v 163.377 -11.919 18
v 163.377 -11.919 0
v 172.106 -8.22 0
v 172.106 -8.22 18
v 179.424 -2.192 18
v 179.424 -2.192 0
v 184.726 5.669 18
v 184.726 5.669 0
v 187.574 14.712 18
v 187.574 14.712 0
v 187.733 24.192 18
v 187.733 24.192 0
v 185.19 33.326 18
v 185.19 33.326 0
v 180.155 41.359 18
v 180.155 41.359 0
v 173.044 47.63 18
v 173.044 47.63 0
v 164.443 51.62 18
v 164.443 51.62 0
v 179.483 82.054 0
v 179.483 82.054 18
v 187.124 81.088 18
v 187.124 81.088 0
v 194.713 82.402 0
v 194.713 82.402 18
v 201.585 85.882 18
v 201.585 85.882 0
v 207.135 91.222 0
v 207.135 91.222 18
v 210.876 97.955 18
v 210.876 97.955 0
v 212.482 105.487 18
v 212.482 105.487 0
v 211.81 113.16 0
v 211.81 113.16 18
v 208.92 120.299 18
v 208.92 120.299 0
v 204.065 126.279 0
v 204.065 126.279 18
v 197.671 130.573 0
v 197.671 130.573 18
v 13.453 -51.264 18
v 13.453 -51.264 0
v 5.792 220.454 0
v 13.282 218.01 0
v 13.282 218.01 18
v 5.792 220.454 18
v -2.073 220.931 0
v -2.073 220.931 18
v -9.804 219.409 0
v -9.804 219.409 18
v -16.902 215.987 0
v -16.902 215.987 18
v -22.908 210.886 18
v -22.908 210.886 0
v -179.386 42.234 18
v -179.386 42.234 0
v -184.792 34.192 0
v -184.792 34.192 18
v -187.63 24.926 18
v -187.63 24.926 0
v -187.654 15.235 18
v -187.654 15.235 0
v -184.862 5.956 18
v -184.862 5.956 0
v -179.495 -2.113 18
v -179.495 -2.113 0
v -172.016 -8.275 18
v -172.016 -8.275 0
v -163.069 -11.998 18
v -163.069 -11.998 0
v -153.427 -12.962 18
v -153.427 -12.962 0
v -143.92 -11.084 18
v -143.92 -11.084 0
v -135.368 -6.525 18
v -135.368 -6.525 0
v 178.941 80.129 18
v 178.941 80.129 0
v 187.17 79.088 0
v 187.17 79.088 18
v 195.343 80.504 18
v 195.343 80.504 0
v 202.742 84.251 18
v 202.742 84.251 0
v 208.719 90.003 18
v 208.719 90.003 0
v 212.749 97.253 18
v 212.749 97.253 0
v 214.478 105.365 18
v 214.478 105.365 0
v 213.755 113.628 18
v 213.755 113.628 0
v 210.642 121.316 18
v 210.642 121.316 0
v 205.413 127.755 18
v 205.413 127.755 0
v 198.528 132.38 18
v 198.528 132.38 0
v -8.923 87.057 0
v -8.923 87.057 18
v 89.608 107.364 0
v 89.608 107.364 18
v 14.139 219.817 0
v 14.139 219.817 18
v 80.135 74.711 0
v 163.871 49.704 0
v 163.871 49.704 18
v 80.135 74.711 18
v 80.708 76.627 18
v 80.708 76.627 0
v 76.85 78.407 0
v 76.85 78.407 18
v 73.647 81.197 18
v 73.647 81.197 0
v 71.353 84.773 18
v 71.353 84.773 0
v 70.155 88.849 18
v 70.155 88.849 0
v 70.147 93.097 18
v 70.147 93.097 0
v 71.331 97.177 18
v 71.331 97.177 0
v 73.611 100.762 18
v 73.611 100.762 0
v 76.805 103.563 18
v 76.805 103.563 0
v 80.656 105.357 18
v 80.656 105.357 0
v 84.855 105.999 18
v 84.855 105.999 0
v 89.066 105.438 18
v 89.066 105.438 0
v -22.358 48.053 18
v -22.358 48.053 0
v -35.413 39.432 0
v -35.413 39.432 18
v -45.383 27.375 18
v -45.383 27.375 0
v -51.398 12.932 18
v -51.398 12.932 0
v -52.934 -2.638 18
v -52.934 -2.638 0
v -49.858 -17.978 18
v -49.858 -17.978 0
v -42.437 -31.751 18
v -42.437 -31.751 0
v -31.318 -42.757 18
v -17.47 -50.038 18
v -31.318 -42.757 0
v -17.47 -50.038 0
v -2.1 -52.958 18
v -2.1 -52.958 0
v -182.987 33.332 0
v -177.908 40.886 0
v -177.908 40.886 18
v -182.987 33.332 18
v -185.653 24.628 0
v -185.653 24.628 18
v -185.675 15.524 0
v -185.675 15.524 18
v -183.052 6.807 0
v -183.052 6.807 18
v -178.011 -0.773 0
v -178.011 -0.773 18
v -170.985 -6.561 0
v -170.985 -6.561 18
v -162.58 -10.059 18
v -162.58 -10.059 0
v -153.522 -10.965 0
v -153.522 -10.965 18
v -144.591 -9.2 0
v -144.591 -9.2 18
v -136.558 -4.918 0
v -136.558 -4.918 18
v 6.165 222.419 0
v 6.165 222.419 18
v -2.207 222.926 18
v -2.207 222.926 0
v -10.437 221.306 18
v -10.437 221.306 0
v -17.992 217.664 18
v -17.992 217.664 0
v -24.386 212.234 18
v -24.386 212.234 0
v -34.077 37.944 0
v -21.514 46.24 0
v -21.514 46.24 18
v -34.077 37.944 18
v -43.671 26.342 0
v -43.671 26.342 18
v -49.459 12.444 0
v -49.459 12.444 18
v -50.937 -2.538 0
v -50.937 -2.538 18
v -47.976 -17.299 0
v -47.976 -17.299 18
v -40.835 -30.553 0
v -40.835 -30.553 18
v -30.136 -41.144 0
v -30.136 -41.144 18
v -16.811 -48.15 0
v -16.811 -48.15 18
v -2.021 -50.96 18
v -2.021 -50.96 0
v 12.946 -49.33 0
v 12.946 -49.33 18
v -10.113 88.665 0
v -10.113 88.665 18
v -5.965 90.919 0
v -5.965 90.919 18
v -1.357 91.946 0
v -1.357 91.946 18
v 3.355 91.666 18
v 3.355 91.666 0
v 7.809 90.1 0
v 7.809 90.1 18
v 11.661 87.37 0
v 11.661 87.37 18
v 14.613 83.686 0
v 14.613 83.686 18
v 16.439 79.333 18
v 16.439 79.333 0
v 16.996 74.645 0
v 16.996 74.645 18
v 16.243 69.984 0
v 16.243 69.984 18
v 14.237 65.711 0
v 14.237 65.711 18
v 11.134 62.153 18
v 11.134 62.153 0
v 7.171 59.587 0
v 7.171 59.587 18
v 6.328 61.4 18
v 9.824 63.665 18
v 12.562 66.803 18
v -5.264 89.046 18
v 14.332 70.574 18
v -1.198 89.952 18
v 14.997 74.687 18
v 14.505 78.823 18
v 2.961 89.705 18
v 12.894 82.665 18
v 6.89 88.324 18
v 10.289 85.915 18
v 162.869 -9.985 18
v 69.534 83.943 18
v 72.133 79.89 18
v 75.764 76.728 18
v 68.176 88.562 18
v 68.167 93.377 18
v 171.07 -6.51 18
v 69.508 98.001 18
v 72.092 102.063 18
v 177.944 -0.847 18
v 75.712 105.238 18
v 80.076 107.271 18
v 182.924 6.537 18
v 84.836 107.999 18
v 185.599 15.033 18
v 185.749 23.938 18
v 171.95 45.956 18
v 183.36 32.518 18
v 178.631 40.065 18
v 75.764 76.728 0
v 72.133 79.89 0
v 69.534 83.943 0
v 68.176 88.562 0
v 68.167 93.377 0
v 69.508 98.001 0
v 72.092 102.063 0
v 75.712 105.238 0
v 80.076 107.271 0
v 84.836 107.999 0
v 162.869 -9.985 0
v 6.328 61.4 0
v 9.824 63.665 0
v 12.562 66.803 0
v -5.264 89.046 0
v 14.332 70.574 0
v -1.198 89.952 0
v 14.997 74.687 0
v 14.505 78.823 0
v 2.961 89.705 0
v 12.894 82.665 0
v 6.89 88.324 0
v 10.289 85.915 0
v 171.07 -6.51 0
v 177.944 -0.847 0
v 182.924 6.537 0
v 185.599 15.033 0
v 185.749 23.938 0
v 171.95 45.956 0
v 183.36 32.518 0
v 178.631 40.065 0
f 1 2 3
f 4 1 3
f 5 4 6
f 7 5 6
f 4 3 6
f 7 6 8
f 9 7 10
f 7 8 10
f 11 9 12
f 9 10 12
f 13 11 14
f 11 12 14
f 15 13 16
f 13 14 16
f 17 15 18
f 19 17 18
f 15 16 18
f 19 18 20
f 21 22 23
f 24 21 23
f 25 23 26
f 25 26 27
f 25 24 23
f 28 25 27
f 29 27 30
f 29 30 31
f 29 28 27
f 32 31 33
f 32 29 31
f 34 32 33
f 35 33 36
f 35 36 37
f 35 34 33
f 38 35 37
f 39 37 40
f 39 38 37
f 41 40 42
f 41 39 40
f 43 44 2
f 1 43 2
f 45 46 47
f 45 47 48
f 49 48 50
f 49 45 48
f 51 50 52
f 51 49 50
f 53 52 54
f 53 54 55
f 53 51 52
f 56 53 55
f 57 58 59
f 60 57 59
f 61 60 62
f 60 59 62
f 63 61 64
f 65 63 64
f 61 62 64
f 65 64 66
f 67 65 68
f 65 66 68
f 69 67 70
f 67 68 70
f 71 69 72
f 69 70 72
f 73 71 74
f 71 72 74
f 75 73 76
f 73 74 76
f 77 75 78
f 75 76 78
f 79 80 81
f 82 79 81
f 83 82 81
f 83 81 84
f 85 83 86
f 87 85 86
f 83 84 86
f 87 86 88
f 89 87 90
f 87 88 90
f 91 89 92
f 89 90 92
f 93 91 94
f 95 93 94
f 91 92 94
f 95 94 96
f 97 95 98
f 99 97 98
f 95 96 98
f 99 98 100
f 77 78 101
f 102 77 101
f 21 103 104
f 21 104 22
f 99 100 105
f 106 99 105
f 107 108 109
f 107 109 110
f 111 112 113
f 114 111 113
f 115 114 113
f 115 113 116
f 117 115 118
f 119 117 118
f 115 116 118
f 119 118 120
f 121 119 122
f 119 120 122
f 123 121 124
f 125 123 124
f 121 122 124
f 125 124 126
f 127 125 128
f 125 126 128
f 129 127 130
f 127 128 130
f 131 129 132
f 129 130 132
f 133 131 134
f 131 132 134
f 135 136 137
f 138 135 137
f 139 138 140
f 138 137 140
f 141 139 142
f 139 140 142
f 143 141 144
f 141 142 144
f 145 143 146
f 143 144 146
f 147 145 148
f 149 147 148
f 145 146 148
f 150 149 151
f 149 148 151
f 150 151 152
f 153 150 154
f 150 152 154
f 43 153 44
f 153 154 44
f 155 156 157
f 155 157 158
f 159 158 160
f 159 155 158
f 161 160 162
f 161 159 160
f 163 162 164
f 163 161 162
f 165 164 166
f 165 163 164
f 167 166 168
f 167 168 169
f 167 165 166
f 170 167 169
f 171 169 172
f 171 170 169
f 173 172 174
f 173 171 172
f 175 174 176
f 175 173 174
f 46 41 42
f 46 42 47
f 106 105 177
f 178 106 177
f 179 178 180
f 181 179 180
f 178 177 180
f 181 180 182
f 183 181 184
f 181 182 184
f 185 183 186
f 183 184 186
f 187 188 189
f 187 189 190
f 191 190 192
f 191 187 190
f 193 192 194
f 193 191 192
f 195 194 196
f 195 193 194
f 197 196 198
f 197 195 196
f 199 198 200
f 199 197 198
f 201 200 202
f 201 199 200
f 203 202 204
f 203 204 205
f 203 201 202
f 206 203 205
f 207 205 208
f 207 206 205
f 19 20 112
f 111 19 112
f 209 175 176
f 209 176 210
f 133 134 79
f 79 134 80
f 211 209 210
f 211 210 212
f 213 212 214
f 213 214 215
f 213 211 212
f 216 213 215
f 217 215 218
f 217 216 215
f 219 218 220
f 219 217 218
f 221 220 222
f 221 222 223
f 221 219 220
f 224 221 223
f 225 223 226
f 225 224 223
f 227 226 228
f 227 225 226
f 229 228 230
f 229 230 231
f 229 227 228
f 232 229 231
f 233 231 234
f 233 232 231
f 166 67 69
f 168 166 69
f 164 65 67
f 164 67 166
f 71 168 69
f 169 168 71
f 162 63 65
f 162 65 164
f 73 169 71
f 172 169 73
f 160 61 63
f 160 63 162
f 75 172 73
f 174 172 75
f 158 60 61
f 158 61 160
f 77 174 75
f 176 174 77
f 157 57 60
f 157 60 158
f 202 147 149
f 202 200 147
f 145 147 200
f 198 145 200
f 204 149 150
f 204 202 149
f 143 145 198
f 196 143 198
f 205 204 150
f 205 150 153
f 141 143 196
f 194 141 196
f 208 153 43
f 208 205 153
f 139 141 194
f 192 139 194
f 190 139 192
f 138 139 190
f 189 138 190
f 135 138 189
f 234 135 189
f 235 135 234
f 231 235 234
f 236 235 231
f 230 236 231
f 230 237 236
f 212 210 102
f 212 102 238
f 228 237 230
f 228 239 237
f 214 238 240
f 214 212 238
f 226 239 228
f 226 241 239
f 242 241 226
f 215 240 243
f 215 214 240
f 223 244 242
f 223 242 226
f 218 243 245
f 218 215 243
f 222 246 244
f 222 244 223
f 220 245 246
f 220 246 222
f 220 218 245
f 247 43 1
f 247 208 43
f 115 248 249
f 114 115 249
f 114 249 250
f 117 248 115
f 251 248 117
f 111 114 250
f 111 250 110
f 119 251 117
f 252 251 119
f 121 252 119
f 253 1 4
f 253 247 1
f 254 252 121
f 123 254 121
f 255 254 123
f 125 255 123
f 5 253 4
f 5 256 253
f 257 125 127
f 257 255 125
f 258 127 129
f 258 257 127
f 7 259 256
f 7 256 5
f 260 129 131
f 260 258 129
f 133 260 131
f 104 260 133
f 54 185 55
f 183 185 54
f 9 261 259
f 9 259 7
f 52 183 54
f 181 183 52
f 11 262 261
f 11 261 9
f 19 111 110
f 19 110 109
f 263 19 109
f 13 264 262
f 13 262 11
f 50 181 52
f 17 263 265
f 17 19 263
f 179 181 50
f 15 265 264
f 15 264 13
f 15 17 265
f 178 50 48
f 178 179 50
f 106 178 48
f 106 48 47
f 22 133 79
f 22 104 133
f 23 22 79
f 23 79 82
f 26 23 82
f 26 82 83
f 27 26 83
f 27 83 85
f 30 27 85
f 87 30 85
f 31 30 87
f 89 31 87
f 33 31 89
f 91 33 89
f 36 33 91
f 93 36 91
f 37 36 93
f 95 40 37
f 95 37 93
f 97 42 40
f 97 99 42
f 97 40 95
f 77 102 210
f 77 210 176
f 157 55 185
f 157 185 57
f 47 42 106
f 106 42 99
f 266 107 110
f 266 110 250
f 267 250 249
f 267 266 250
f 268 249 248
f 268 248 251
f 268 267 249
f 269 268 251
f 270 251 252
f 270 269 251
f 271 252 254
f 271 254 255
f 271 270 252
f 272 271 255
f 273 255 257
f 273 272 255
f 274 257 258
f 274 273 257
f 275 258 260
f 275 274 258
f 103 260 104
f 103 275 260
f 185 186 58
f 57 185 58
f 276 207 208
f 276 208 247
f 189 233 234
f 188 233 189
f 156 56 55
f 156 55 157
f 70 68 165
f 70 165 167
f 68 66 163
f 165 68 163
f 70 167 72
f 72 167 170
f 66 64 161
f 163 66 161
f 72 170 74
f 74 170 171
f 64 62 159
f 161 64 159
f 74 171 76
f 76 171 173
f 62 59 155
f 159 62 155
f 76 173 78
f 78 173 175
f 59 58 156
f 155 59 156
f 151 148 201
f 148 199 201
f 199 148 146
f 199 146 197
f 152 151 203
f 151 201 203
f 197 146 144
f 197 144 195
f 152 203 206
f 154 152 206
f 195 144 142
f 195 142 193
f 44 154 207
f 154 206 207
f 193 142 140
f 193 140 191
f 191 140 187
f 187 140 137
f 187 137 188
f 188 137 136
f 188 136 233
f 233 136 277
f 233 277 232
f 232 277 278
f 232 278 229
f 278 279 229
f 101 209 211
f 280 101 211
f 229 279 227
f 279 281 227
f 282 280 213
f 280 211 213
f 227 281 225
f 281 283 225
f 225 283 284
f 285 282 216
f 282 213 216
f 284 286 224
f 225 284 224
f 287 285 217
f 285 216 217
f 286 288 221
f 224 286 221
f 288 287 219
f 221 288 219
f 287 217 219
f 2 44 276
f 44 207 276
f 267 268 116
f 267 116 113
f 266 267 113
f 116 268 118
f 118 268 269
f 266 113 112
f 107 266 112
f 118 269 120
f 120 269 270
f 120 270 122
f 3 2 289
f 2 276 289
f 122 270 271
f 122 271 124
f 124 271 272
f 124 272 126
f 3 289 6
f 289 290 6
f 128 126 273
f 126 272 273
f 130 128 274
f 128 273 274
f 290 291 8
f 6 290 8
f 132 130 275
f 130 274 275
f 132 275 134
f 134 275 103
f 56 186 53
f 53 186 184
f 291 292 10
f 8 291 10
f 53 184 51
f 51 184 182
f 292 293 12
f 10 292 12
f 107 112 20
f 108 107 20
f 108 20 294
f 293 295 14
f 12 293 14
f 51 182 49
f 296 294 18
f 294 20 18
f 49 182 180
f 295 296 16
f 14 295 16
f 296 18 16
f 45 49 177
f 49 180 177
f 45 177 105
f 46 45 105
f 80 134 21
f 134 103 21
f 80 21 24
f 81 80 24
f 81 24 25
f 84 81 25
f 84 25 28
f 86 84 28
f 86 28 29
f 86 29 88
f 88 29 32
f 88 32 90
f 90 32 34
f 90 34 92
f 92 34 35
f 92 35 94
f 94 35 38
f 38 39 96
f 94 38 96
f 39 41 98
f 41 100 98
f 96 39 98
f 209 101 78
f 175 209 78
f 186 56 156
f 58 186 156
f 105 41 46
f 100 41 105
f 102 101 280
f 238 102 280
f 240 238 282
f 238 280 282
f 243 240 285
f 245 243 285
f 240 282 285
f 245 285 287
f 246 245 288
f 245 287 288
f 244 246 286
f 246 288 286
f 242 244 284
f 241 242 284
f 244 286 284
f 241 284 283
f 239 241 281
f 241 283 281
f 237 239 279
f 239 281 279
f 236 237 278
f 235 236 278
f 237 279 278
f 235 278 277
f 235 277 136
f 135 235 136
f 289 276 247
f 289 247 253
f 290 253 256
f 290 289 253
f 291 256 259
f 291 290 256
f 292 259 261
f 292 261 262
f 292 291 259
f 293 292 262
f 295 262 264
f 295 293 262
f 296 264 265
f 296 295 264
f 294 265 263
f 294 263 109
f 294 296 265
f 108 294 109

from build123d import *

# Parameters (mm, degrees)
EXTRUDE_THIN1_DEPTH = 18


with BuildPart() as part:
    # Sketch1 → Extrude-Thin1 (new body)
    with BuildSketch(Plane.XY):
        with BuildLine():
            Line((6.327716808, 61.4), (-22.357932721, 48.053333333))
            ThreePointArc((-22.357932721, 48.053333333), (-49.857891872, -17.97750311), (13.453428864, -51.264073695))
            Line((13.453428864, -51.264073695), (163.376663255, -11.919140225))
            ThreePointArc((163.376663255, -11.919140225), (187.995352271, 19.446169247), (164.443175515, 51.620032198))
            Line((164.443175515, 51.620032198), (80.707647493, 76.627258092))
            ThreePointArc((80.707647493, 76.627258092), (70.593974061, 95.179284225), (89.0659579, 105.438420494))
            Line((89.0659579, 105.438420494), (178.940955528, 80.129006849))
            ThreePointArc((178.940955528, 80.129006849), (212.749176963, 97.252513036), (198.527826902, 132.380329695))
            Line((198.527826902, 132.380329695), (14.139419596, 219.817391125))
            ThreePointArc((14.139419596, 219.817391125), (-6.373631689, 222.37864758), (-24.385542849, 212.233877304))
            Line((-24.385542849, 212.233877304), (-179.385542849, 42.233877304))
            ThreePointArc((-179.385542849, 42.233877304), (-179.495266598, -2.112935452), (-135.368386906, -6.525455083))
            Line((-135.368386906, -6.525455083), (-8.923460497, 87.057025038))
            ThreePointArc((-8.923460497, 87.057025038), (12.893998789, 82.664515329), (6.327716808, 61.4))
        make_face()
        with BuildLine():
            Line((7.171412382, 59.586666667), (-21.514237147, 46.24))
            ThreePointArc((-21.514237147, 46.24), (-47.97646199, -17.299106766), (12.945752303, -49.329580348))
            Line((12.945752303, -49.329580348), (162.868986694, -9.984646878))
            ThreePointArc((162.868986694, -9.984646878), (185.995633952, 19.479734747), (163.870861847, 49.70366661))
            Line((163.870861847, 49.70366661), (80.135333826, 74.710892504))
            ThreePointArc((80.135333826, 74.710892504), (68.673170602, 95.736522122), (89.60808562, 107.363543226))
            Line((89.60808562, 107.363543226), (179.483083248, 82.054129582))
            ThreePointArc((179.483083248, 82.054129582), (210.876431723, 97.954528184), (197.670892381, 130.573215081))
            Line((197.670892381, 130.573215081), (13.282485075, 218.010276511))
            ThreePointArc((13.282485075, 218.010276511), (-5.98735098, 220.416305302), (-22.907631161, 210.886369588))
            Line((-22.907631161, 210.886369588), (-177.907631161, 40.886369588))
            ThreePointArc((-177.907631161, 40.886369588), (-178.010704986, -0.772757545), (-136.558181639, -4.917851744))
            Line((-136.558181639, -4.917851744), (-10.11325523, 88.664628376))
            ThreePointArc((-10.11325523, 88.664628376), (14.613198627, 83.686450706), (7.171412382, 59.586666667))
        make_face(mode=Mode.SUBTRACT)
    extrude(amount=EXTRUDE_THIN1_DEPTH)


solid = part.part
